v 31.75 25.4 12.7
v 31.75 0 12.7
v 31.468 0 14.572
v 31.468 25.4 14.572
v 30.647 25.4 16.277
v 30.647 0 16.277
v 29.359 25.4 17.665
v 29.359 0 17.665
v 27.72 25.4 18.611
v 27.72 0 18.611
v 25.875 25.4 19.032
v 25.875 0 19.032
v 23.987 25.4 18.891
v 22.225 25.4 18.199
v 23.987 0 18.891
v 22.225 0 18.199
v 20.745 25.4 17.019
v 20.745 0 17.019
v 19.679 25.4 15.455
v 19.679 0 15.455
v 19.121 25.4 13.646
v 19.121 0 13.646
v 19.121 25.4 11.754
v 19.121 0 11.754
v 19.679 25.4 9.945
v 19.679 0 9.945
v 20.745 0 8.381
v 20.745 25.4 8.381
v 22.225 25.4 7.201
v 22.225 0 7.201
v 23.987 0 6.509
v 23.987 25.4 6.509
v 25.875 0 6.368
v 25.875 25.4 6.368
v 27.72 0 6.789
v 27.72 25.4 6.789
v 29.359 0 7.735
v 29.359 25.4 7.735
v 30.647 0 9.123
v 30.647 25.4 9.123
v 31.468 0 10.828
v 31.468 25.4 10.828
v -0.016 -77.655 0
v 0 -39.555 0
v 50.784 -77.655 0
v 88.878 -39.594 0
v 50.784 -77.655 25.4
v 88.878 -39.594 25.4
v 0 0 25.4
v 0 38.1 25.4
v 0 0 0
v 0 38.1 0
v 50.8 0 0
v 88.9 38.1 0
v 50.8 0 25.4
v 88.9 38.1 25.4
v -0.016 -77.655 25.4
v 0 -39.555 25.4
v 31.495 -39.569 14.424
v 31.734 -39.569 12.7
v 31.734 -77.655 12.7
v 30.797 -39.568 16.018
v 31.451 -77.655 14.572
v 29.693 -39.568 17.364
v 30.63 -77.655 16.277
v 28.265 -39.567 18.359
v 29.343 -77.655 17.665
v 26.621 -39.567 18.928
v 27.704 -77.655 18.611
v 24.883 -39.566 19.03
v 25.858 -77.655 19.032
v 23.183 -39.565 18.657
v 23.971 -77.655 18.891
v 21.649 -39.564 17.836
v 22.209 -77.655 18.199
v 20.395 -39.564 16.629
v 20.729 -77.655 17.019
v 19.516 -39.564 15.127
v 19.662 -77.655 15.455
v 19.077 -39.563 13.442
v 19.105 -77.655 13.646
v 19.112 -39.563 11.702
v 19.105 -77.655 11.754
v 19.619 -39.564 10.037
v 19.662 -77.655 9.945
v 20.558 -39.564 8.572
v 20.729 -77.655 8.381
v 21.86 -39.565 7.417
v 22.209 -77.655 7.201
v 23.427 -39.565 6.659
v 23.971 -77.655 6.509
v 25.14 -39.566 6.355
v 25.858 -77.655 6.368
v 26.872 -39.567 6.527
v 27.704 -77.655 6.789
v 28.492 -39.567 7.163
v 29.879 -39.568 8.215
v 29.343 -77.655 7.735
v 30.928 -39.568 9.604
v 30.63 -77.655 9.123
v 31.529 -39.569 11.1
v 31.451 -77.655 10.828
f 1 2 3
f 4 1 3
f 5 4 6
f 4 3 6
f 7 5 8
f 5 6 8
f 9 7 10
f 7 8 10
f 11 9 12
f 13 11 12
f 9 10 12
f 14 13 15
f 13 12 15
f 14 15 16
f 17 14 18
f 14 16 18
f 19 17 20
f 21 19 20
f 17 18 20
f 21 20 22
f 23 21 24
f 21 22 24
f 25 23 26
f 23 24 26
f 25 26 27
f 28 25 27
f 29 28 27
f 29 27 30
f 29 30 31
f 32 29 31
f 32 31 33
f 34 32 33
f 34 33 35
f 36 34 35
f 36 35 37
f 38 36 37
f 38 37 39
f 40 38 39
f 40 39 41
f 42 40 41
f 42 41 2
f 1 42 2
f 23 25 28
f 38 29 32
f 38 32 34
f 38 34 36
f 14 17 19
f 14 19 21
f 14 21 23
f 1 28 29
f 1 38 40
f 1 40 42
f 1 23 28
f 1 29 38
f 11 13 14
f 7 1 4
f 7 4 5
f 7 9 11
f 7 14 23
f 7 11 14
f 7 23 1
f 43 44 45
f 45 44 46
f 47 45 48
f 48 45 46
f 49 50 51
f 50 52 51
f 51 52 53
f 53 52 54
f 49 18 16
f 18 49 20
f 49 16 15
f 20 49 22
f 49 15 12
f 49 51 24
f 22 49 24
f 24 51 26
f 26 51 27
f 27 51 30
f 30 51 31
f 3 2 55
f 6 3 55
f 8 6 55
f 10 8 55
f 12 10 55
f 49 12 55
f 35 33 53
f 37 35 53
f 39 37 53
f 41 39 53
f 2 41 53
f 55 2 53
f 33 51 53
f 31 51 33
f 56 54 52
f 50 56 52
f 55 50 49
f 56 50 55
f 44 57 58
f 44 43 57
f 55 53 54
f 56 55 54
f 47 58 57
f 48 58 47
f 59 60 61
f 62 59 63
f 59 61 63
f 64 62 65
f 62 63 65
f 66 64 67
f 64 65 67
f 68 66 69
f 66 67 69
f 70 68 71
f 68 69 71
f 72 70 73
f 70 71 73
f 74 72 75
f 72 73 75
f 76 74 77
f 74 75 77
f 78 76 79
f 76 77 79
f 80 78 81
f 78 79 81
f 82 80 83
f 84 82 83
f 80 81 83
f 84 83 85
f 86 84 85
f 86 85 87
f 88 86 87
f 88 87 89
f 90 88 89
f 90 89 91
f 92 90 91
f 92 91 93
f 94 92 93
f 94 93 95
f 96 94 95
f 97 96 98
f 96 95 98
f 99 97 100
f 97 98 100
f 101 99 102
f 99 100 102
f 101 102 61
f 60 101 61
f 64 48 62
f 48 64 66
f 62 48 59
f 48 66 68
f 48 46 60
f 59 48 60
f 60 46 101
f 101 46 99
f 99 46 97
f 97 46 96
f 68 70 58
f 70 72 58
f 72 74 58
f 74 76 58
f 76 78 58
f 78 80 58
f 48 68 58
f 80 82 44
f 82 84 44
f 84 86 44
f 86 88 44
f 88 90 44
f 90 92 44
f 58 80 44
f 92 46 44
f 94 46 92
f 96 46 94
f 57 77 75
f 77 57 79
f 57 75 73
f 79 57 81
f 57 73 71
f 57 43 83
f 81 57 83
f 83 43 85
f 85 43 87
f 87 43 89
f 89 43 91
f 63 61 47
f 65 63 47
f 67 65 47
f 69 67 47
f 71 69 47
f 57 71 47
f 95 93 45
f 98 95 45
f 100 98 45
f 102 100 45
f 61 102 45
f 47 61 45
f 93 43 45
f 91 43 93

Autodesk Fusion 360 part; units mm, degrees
sketch "Sketch1" plane through (0, 0, 0) normal (0, 0, 1) x (1, 0, 0)
  line L0 (0, 0) -> (50.8, 0)
  line L1 (50.8, 0) -> (88.9, 38.1)
  line L2 (88.9, 38.1) -> (0, 38.1)
  line L3 (0, 38.1) -> (0, 0)
  line L4 (-0.0164, -77.6551) -> (50.7836, -77.6551)
  line L5 (50.7836, -77.6551) -> (88.8781, -39.5935)
  line L6 (88.8781, -39.5935) -> (0, -39.5551)
  line L7 (-0.0164, -77.6551) -> (0, -39.5551)
  dimension "d1" = 50.8
  dimension "d2" = 38.1
  dimension "d3" = 45
  dimension "d4" = 50.8
  dimension "d5" = 38.1
  dimension "d6" = 45
extrude "Extrude1" add sketch "Sketch1" along normal blind 25.4 makes body 1 at (46.5667, 25.4, 0) makes body 2 at (46.5539, -52.2679, 0)
sketch "Sketch2" plane through (0, 0, 0) normal (0, -1, 0) x (1, 0, 0)
  line L0 (0, 0) -> (50.8, 0)
  line L1 (50.8, 0) -> (50.8, 25.4)
  line L2 (50.8, 25.4) -> (0, 25.4)
  line L3 (0, 25.4) -> (0, 0)
  circle A0 centre (25.4, 12.7) radius 6.35
  dimension "d9" = 12.7
  dimension "d10" = 25.4
  dimension "d11" = 12.7
sketch "Sketch3" plane through (0, -77.6551, 0) normal (0, -1, 0) x (1, 0, 0)
  line L0 (-0.0164, 0) -> (50.7836, 0)
  line L1 (50.7836, 0) -> (50.7836, 25.4)
  line L2 (50.7836, 25.4) -> (-0.0164, 25.4)
  circle A0 centre (25.3836, 12.7) radius 6.35
  line L3 (-0.0164, 12.7) -> (25.3836, 12.7) construction
  line L4 (25.3836, 12.7) -> (25.3836, 0) construction
  line L5 (-0.0164, 25.4) -> (-0.0164, 0)
  dimension "d12" = 12.7
extrude "Extrude2" cut sketch "Sketch2" against normal blind 25.4 contours A0 bodies 1
extrude "Extrude3" cut sketch "Sketch3" against normal through all contours A0 bodies 2
